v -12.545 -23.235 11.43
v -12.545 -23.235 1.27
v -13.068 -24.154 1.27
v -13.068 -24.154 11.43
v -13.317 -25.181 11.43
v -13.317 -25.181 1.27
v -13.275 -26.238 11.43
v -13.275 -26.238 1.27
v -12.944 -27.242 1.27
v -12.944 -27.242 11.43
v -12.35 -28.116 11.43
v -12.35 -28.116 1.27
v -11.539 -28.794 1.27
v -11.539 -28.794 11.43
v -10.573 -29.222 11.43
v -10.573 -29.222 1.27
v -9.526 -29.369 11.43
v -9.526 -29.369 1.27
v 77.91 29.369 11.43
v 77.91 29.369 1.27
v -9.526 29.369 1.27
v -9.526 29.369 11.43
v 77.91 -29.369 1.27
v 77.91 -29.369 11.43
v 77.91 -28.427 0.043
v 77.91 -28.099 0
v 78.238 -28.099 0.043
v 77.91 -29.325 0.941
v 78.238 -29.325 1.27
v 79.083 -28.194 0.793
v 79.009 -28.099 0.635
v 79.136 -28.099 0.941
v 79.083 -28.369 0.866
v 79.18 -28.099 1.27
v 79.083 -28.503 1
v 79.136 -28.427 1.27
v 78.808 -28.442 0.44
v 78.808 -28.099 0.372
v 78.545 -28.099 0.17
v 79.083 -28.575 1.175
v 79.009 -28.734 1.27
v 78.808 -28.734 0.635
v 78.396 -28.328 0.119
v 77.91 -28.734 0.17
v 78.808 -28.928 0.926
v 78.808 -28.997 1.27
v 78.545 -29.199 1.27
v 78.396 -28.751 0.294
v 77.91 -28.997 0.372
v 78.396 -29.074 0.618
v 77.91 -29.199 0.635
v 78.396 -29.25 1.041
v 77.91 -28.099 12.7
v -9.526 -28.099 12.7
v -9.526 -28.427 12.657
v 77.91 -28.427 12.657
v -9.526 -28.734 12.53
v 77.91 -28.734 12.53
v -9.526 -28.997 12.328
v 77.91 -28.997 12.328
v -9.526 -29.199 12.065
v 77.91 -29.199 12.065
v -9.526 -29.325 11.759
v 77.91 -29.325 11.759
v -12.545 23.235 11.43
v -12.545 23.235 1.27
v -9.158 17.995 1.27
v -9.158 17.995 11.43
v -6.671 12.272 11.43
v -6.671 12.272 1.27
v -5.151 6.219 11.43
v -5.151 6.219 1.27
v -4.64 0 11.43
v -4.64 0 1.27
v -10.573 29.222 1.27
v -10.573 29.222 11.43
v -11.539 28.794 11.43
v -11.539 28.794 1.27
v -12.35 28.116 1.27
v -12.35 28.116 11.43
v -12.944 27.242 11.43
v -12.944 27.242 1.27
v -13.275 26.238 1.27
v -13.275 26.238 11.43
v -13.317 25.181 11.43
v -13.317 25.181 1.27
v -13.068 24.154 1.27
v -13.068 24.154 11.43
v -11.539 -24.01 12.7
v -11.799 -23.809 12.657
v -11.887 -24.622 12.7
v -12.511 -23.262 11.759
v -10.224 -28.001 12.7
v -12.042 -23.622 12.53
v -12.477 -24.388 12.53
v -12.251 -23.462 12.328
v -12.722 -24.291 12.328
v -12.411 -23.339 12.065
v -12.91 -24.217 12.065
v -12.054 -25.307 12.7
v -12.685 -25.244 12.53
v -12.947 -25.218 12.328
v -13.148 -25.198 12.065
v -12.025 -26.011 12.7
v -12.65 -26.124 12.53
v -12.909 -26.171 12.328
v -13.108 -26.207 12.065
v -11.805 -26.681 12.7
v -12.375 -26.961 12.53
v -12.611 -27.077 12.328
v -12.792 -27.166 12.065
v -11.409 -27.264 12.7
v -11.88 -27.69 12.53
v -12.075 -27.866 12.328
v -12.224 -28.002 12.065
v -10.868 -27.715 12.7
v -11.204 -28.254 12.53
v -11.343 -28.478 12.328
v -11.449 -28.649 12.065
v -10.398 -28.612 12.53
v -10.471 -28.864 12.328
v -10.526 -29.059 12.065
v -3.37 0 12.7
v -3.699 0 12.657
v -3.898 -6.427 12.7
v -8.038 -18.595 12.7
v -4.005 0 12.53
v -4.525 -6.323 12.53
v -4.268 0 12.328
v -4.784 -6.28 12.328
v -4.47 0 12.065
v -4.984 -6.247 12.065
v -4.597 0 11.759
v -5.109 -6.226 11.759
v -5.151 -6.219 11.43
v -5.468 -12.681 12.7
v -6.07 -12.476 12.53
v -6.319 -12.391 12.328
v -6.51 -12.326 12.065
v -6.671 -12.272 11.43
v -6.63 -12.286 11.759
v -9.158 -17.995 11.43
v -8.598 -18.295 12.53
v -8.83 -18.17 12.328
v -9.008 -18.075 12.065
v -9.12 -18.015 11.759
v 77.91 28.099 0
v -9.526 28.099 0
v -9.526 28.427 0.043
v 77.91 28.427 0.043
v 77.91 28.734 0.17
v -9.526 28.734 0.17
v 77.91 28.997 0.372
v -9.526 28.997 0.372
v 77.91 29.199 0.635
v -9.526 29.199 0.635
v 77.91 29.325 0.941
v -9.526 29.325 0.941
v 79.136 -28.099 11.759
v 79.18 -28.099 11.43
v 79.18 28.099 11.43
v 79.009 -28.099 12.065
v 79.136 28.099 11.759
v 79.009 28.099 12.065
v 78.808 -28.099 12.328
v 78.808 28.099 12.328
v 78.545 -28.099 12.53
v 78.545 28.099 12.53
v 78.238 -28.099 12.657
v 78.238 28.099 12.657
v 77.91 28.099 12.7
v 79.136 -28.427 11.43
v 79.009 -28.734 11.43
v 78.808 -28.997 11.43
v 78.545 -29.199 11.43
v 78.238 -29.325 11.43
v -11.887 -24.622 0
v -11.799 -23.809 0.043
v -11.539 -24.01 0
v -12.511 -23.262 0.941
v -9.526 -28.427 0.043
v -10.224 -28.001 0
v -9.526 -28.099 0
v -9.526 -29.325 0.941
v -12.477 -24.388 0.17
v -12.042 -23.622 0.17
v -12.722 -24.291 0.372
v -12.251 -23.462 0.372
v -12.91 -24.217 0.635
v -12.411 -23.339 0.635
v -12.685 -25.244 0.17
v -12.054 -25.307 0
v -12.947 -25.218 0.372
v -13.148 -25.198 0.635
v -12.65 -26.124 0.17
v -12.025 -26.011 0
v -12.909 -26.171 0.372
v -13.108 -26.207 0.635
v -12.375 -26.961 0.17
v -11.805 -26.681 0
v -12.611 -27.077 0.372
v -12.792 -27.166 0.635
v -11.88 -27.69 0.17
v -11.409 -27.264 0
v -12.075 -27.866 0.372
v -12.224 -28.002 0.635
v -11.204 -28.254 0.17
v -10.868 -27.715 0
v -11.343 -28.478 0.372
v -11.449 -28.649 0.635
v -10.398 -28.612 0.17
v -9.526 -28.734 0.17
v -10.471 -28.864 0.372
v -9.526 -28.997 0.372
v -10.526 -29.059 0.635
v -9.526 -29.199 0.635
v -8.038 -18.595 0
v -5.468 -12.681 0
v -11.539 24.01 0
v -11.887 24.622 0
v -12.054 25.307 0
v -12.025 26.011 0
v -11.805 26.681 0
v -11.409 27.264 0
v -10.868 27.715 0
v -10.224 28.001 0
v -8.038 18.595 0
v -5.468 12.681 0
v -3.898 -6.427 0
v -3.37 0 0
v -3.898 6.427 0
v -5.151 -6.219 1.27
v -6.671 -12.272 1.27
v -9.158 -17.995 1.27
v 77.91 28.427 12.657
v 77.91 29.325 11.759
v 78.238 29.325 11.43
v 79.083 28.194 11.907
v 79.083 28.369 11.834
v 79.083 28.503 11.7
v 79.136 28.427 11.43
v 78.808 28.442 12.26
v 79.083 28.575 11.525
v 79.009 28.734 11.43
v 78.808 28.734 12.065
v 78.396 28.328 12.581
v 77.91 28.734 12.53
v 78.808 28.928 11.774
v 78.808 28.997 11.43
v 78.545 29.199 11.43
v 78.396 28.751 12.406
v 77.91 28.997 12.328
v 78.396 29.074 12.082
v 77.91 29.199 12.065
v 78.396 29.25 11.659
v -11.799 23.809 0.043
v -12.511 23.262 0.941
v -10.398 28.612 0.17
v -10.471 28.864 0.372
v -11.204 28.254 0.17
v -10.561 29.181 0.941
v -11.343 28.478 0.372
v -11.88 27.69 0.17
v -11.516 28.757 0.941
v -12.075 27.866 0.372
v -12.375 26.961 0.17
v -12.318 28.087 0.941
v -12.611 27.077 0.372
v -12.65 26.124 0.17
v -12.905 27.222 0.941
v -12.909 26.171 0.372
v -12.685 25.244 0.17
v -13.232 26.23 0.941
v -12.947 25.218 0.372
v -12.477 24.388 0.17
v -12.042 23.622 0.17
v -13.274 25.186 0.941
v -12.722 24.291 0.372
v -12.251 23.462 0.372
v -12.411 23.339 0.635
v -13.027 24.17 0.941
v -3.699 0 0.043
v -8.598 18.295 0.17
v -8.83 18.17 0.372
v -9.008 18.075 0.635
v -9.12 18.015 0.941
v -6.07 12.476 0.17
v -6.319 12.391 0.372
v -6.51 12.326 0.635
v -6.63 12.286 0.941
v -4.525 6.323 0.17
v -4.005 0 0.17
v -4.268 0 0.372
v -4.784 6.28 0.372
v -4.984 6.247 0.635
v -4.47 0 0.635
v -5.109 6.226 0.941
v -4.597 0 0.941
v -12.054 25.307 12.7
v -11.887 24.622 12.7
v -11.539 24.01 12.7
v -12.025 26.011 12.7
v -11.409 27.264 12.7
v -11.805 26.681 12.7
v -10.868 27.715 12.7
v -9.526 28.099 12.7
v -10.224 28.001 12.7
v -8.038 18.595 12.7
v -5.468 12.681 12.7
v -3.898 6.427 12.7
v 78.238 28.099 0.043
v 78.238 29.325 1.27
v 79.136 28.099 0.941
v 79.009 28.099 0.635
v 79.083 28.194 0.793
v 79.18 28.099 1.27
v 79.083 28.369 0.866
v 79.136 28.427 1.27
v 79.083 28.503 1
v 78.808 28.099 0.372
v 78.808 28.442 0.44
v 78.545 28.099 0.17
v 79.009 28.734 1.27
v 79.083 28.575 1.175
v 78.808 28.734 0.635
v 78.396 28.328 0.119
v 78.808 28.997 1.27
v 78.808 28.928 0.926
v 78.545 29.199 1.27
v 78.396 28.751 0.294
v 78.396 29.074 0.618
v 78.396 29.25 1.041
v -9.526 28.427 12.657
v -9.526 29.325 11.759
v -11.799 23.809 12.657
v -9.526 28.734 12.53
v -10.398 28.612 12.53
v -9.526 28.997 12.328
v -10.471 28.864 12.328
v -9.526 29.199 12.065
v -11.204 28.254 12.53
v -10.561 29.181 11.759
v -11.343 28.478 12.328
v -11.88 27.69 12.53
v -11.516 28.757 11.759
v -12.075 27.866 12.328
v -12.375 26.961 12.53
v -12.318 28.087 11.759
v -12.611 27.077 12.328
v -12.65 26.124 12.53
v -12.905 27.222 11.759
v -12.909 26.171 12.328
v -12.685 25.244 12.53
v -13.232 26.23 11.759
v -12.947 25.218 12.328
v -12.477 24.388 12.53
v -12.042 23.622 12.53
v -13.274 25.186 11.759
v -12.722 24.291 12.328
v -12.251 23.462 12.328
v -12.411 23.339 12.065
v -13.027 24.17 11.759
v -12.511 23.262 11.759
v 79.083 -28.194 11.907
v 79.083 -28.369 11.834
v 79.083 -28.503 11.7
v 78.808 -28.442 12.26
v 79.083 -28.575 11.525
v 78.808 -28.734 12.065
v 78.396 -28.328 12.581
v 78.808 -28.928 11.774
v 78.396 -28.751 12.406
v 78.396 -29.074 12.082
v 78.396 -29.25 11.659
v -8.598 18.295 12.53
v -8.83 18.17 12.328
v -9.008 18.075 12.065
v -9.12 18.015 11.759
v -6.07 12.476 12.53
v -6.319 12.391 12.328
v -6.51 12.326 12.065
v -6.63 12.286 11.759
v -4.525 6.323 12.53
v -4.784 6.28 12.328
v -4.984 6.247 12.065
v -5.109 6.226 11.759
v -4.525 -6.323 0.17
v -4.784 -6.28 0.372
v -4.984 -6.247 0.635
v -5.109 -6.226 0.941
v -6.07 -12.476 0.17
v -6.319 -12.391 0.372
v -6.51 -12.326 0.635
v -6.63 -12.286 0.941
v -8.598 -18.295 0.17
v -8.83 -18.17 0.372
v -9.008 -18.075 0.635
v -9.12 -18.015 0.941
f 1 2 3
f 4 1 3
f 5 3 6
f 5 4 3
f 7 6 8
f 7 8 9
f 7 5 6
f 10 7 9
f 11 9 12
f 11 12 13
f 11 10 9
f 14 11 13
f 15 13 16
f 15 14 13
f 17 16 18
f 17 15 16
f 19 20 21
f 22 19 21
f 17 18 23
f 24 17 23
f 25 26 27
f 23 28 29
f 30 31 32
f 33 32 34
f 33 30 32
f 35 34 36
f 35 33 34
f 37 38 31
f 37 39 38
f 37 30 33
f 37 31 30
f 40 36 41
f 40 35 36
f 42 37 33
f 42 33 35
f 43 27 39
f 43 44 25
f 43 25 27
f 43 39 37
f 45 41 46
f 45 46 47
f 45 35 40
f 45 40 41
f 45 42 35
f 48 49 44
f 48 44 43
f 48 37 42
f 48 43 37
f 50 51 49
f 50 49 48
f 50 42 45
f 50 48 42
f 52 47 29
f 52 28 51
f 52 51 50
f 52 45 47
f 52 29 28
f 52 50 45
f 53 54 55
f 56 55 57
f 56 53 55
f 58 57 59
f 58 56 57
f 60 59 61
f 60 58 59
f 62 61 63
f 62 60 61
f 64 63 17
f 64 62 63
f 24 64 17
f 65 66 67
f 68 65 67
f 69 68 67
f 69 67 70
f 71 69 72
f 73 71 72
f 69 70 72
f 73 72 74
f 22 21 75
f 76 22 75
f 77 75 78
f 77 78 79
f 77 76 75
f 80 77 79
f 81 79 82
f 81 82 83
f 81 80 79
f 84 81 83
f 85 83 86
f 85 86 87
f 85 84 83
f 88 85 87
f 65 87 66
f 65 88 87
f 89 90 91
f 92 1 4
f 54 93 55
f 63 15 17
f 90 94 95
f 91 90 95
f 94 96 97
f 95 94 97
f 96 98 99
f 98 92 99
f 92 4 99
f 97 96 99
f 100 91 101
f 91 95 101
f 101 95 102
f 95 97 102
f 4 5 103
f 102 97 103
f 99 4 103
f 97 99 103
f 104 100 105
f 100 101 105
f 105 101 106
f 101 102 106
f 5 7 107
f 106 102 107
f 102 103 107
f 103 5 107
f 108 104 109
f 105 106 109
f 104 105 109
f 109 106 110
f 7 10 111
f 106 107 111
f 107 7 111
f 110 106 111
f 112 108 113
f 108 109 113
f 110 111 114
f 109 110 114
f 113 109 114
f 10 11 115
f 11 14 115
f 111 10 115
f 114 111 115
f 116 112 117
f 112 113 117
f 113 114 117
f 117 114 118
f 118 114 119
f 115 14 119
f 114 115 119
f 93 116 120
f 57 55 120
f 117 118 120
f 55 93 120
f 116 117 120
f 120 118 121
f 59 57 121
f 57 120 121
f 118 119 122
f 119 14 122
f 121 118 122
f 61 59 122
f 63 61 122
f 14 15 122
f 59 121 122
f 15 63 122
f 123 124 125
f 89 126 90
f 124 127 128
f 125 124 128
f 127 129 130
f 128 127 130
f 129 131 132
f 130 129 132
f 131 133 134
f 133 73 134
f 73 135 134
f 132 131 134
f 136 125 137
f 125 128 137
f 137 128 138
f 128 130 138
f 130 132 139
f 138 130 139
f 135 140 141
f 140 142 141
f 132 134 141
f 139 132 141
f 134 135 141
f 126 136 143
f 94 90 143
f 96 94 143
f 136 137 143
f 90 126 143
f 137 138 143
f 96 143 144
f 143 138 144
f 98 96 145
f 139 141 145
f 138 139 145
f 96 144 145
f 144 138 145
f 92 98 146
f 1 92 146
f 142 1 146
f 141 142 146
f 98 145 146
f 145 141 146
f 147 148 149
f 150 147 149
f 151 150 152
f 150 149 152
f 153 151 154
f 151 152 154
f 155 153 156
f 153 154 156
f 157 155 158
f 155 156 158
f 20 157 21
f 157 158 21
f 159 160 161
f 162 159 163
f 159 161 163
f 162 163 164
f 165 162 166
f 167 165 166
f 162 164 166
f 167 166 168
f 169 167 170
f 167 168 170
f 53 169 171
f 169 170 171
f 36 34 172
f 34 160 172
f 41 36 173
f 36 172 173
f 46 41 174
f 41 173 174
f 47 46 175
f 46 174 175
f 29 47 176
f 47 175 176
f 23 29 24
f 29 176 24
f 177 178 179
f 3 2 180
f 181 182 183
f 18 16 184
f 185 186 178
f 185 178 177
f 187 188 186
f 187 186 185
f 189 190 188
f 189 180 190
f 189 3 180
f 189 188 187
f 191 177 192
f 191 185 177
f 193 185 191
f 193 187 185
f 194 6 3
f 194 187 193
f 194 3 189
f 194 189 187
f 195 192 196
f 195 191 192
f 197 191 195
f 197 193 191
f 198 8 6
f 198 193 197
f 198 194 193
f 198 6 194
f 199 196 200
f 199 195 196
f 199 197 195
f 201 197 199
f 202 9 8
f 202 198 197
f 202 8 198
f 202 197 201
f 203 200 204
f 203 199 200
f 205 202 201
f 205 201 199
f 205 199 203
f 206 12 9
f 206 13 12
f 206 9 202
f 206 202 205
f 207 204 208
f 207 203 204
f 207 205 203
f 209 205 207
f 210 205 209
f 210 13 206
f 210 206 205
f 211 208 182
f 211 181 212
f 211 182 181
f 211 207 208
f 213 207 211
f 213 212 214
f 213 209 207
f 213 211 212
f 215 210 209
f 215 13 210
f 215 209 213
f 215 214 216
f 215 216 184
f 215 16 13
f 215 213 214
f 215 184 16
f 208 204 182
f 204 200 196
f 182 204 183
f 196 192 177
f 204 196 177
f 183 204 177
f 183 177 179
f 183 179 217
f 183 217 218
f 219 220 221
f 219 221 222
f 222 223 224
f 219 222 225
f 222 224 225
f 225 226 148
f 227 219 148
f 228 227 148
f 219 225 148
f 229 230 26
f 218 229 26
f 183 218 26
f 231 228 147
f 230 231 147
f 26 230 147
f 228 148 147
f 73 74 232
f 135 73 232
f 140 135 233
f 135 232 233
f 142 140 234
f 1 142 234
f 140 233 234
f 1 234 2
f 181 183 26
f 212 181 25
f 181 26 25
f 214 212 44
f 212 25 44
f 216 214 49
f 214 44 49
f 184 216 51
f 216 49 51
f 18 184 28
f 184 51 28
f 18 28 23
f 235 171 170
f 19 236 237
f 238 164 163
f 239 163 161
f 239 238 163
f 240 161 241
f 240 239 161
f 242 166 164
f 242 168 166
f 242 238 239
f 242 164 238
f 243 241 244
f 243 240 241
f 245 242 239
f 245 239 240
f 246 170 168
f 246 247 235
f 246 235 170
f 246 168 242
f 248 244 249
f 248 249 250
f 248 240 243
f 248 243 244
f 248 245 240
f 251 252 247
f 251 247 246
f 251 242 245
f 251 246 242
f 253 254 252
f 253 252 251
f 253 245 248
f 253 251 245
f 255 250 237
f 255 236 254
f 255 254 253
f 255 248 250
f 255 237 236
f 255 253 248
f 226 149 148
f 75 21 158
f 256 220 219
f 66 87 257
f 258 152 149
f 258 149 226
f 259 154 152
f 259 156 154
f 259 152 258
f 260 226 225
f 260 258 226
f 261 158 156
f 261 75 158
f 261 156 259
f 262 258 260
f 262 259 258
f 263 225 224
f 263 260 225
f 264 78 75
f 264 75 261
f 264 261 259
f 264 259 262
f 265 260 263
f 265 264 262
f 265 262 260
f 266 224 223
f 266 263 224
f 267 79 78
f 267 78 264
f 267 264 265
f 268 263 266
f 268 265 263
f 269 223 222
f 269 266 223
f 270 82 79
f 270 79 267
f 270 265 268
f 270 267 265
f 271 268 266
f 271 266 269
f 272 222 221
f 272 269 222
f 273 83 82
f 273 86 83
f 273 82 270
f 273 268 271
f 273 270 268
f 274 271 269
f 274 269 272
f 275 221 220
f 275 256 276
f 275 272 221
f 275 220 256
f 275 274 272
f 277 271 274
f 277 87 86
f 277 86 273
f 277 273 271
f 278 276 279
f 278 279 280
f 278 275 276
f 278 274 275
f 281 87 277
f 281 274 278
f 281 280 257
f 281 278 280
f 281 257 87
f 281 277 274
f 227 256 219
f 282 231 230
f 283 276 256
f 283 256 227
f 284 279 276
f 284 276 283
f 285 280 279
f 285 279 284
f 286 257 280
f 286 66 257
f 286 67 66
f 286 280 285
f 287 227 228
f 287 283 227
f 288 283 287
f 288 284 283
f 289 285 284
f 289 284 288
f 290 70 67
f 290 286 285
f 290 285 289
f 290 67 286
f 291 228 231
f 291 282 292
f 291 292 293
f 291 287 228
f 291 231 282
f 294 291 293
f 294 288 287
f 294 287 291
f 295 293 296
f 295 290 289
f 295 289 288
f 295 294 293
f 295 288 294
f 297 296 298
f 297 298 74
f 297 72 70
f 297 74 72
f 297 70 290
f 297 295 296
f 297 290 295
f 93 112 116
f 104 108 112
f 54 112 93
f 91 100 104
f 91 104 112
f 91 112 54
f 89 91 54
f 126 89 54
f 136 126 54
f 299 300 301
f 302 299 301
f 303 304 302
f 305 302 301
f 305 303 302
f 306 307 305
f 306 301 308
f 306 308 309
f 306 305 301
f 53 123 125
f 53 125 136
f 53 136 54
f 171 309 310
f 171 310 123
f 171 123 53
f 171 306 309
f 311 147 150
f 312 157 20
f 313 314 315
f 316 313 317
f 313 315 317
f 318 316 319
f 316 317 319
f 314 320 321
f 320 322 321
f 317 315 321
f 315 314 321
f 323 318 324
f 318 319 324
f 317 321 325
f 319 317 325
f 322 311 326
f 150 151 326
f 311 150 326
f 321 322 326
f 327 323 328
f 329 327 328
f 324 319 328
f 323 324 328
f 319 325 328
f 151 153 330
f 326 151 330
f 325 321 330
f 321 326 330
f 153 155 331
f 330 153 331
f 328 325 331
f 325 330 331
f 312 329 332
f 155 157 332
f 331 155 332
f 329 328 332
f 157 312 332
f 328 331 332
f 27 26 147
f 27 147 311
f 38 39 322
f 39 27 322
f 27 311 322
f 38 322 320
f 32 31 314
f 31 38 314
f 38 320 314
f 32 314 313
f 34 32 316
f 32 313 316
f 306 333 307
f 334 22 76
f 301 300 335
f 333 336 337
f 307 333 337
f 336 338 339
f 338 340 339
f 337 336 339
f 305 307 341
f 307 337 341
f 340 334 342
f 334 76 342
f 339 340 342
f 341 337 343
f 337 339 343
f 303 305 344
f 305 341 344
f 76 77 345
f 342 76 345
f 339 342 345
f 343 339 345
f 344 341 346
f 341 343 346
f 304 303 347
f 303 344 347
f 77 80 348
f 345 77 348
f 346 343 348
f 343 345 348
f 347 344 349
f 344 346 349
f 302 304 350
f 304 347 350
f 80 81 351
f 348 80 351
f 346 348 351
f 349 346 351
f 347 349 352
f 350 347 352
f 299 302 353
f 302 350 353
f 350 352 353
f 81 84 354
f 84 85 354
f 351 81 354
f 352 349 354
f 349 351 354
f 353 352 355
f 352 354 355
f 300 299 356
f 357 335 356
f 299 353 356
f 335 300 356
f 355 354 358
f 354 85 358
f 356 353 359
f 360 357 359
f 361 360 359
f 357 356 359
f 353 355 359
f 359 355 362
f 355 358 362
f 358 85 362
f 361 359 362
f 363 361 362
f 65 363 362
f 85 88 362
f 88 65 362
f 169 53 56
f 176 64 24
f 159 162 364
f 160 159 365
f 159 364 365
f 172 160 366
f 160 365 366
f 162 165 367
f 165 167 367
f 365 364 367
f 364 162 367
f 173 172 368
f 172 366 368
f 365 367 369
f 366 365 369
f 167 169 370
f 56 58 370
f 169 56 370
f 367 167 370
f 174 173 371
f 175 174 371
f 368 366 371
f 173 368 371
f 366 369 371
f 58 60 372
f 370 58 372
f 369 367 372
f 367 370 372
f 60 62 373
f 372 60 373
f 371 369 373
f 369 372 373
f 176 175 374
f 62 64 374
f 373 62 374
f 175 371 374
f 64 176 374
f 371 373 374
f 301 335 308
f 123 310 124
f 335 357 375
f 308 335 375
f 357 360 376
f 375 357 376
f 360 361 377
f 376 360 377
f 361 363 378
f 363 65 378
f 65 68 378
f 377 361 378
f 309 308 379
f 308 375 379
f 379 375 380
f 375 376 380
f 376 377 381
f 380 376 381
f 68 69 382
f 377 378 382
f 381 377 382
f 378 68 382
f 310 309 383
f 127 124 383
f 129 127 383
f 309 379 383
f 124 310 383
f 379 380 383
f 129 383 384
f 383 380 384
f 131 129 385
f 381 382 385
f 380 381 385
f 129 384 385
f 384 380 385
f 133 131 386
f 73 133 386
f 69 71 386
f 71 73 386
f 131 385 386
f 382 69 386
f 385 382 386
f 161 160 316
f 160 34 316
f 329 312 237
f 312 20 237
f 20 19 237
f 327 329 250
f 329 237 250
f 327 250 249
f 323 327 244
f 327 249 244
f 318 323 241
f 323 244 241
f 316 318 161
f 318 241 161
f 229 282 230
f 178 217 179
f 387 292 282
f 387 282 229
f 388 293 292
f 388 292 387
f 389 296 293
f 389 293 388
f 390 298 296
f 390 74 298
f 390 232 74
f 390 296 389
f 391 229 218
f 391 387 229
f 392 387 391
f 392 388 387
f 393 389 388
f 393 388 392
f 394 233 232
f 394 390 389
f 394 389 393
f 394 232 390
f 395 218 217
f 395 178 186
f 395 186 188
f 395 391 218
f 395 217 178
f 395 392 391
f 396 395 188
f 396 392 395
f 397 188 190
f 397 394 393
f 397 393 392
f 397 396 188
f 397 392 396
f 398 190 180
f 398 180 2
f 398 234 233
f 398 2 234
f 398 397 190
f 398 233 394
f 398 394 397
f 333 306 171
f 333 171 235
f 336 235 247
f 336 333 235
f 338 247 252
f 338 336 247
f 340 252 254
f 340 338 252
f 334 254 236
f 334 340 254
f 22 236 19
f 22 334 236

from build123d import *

# Parameters (mm, degrees)
F1_DEPTH = 12.7
F2_R     = 3.81
F3_R     = 1.27


with BuildPart() as f1:
    # F0 (on Top) → F1 (new body)
    with BuildSketch(Plane.XY):
        with BuildLine():
            Line((79.179575, 29.36875), (-18.46932, 29.36875))
            ThreePointArc((-18.46932, 29.36875), (-8.27059, 16.230849), (-4.640425, 0))
            ThreePointArc((-4.640425, 0), (-8.27059, -16.230849), (-18.46932, -29.36875))
            Line((-18.46932, -29.36875), (79.179575, -29.36875))
            Line((79.179575, -29.36875), (79.179575, 29.36875))
        make_face()
    extrude(amount=F1_DEPTH)

    # F2
    f2_edges = [f1.edges().sort_by_distance(p)[0] for p in [
        (-18.46932, 29.36875, 6.35),
        (-18.46932, -29.36875, 6.35),
    ]]
    fillet(f2_edges, radius=F2_R)

    # F3
    f3_edges = [f1.edges().sort_by_distance(p)[0] for p in [
        (34.82679, -29.36875, 12.7),
        (-12.944234, -27.241527, 12.7),
        (79.179575, 0, 12.7),
        (-4.640425, 0, 12.7),
        (34.82679, 29.36875, 12.7),
        (-12.944234, 27.241527, 12.7),
        (34.82679, -29.36875, 0),
        (-12.944234, -27.241527, 0),
        (79.179575, 0, 0),
        (-4.640425, 0, 0),
        (34.82679, 29.36875, 0),
        (-12.944234, 27.241527, 0),
        (79.179575, -29.36875, 6.35),
        (79.179575, 29.36875, 6.35),
    ]]
    fillet(f3_edges, radius=F3_R)


solid = f1.part
